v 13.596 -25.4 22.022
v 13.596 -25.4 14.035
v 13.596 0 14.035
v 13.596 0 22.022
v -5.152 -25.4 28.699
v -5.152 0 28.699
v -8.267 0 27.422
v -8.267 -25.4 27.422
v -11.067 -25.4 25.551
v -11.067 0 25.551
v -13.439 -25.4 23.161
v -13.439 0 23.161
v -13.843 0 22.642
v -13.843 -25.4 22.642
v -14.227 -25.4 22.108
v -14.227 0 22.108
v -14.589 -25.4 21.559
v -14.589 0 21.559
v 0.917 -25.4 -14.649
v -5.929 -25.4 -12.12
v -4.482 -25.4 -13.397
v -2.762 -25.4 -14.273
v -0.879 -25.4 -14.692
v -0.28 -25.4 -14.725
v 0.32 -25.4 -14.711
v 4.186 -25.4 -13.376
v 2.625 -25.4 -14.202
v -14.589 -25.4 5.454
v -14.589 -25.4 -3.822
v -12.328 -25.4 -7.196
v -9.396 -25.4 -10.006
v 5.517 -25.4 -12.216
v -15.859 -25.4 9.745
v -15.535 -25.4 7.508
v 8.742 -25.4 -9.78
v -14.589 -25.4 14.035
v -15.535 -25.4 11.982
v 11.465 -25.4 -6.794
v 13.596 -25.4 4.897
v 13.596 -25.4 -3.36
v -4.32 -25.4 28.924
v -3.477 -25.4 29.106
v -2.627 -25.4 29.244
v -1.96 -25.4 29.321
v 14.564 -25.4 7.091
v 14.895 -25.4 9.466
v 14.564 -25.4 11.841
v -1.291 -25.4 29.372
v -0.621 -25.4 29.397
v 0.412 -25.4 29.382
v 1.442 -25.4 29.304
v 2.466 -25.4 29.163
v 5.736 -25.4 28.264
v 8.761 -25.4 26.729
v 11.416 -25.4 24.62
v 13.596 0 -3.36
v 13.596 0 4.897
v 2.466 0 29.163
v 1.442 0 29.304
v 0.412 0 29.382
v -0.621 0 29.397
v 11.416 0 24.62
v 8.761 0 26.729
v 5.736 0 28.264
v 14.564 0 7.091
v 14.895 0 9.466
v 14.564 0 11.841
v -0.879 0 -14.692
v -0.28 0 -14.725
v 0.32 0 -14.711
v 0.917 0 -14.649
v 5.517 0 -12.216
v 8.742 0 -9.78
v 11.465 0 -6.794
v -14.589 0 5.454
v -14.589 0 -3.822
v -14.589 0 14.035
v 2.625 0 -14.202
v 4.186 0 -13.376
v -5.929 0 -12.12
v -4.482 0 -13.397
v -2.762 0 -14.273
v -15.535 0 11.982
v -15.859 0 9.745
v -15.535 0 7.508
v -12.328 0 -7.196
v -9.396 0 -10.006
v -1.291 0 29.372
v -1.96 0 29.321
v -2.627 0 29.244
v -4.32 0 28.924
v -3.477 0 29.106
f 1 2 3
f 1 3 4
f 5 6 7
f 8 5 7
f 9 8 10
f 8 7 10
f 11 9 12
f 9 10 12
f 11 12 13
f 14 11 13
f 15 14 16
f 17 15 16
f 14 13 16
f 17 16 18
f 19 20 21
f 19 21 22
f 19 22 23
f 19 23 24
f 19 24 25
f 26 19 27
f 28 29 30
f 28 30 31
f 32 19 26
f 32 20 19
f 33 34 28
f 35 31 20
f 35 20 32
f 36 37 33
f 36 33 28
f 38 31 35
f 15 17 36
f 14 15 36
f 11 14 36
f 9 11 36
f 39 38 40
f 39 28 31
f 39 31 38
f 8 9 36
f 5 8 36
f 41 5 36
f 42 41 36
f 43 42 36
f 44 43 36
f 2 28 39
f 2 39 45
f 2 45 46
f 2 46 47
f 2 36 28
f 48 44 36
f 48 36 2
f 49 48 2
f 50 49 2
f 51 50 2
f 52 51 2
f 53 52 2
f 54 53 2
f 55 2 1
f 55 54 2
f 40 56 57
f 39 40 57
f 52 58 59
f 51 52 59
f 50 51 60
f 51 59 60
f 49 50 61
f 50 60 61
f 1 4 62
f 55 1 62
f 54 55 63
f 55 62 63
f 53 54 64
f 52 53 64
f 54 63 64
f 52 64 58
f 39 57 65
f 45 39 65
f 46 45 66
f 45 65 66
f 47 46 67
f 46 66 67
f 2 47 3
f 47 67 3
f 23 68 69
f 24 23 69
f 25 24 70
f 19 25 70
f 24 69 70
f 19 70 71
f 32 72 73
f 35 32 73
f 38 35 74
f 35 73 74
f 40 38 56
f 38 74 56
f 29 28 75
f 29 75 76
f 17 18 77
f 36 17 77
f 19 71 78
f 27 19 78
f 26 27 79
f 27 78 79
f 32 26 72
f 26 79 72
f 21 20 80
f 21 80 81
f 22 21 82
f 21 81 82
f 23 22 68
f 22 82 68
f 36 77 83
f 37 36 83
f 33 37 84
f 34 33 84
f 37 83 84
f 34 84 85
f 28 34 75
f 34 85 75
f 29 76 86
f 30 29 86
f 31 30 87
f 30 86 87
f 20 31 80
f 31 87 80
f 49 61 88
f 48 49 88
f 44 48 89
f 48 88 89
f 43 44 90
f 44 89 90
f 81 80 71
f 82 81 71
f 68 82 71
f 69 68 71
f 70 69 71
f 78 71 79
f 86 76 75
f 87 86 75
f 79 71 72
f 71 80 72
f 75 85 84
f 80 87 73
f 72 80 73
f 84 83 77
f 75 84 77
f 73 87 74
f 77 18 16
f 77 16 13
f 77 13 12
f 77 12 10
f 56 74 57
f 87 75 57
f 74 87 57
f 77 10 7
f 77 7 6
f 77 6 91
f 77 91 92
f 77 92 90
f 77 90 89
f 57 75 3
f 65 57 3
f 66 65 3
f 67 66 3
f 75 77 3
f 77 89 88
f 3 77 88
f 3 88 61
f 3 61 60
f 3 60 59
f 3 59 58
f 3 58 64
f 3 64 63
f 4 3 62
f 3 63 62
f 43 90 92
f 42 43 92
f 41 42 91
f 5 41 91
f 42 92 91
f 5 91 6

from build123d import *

# Parameters (mm, degrees)
F0_R     = 2.5545771164
F1_DEPTH = 25.4


with BuildPart() as f1:
    # F0 (on Front) → F1 (new body)
    with BuildSketch(Plane.XZ):
        with BuildLine():
            ThreePointArc((5.5173615, -12.2159869029), (10.1722749208, -8.349582263), (13.5962825941, -3.3602461101))
            Line((13.5962825941, -3.3602461101), (13.5962825941, 4.8974110327))
            Line((13.5962825941, 4.8974110327), (13.5962825941, 14.0348058194))
            Line((13.5962825941, 14.0348058194), (13.5962825941, 22.0215348944))
            ThreePointArc((13.5962825941, 22.0215348944), (7.0004948303, 23.9860138876), (2.4660649804, 29.163130834))
            ThreePointArc((2.4660649804, 29.163130834), (0.9278228298, 29.3509775836), (-0.6211690061, 29.3967990577))
            ThreePointArc((-0.6211690061, 29.3967990577), (-6.7674815186, 23.985159586), (-14.5891272378, 21.5592870597))
            Line((-14.5891272378, 21.5592870597), (-14.5891272378, 14.0348058194))
            Line((-14.5891272378, 14.0348058194), (-14.5891272378, 5.4543889128))
            Line((-14.5891272378, 5.4543889128), (-14.5891272378, -3.8224939448))
            ThreePointArc((-14.5891272378, -3.8224939448), (-10.9382332049, -8.6804949763), (-5.9286805309, -12.1204925444))
            ThreePointArc((-5.9286805309, -12.1204925444), (-3.6496885116, -13.8889948714), (-0.8791223551, -14.6923430381))
            Line((-0.8791223551, -14.6923430381), (-1.524235704, -12.442663312))
            Line((-1.524235704, -12.442663312), (-0.8053276106, -12.442663312))
            Line((-0.8053276106, -12.442663312), (1.6964728711, -12.442663312))
            Line((1.6964728711, -12.442663312), (0.9172699194, -14.6494874696))
            ThreePointArc((0.9172699194, -14.6494874696), (3.4296394179, -13.8340966584), (5.5173615, -12.2159869029))
        make_face()
        with BuildLine():
            ThreePointArc((4.1042999377, -5.4248327223), (-0.1629000623, -7.0430521679), (-4.4301000623, -5.4248327223))
            ThreePointArc((-4.4301000623, -5.4248327223), (-0.1629000623, -4.7424848144), (4.1042999377, -5.4248327223))
        make_face(mode=Mode.SUBTRACT)
        with BuildLine():
            ThreePointArc((-5.5468901992, -5.0085484982), (-0.1374995827, -3.3742803628), (5.2100941539, -5.2006375045))
            ThreePointArc((5.2100941539, -5.2006375045), (-0.1549943991, -4.3539900851), (-5.5468901992, -5.0085484982))
        make_face(mode=Mode.SUBTRACT)
        with BuildLine():
            Line((-1.1811126024, 3.6468864419), (0, 8.5498616099))
            Line((0, 8.5498616099), (0.9875110118, 3.6468864419))
            ThreePointArc((0.9875110118, 3.6468864419), (-0.0968007953, 3.4477826759), (-1.1811126024, 3.6468864419))
        make_face(mode=Mode.SUBTRACT)
        with Locations((-5.9286805309, 12.5275942676)):
            Circle(F0_R, mode=Mode.SUBTRACT)
        with Locations((5.2393031111, 12.5385038482)):
            Circle(F0_R, mode=Mode.SUBTRACT)
        with Locations((-5.9286805309, 12.5275942676)):
            Circle(F0_R)
        with Locations((5.2393031111, 12.5385038482)):
            Circle(F0_R)
        with BuildLine():
            ThreePointArc((-14.5891272378, 21.5592870597), (-8.0233624944, 24.4917266981), (-2.6266052104, 29.2439345762))
            ThreePointArc((-2.6266052104, 29.2439345762), (-3.8995230158, 29.0200605642), (-5.1515523835, 28.6993398522))
            ThreePointArc((-5.1515523835, 28.6993398522), (-9.00952741, 25.5027604596), (-13.4385656433, 23.1606008906))
            ThreePointArc((-13.4385656433, 23.1606008906), (-14.0372751917, 22.3767777904), (-14.5891272378, 21.5592870597))
        make_face()
        with BuildLine():
            ThreePointArc((-14.5891272378, 21.5592870597), (-6.7674815186, 23.985159586), (-0.6211690061, 29.3967990577))
            ThreePointArc((-0.6211690061, 29.3967990577), (-1.6261684912, 29.3502963848), (-2.6266052104, 29.2439345762))
            ThreePointArc((-2.6266052104, 29.2439345762), (-8.0233624944, 24.4917266981), (-14.5891272378, 21.5592870597))
        make_face()
        with BuildLine():
            ThreePointArc((4.1042999377, -5.4248327223), (-0.1629000623, -4.7424848144), (-4.4301000623, -5.4248327223))
            ThreePointArc((-4.4301000623, -5.4248327223), (-0.1629000623, -7.0430521679), (4.1042999377, -5.4248327223))
        make_face()
        with BuildLine():
            ThreePointArc((2.4660649804, 29.163130834), (8.0510188895, 25.6232615682), (13.5962825941, 22.0215348944))
            ThreePointArc((13.5962825941, 22.0215348944), (8.7605664052, 26.7290953796), (2.4660649804, 29.163130834))
        make_face()
        with BuildLine():
            ThreePointArc((2.4660649804, 29.163130834), (7.5150761888, 24.7879918416), (13.5962825941, 22.0215348944))
            ThreePointArc((13.5962825941, 22.0215348944), (8.0510188895, 25.6232615682), (2.4660649804, 29.163130834))
        make_face()
        with BuildLine():
            ThreePointArc((2.4660649804, 29.163130834), (7.0004948303, 23.9860138876), (13.5962825941, 22.0215348944))
            ThreePointArc((13.5962825941, 22.0215348944), (7.5150761888, 24.7879918416), (2.4660649804, 29.163130834))
        make_face()
        with BuildLine():
            ThreePointArc((-13.4385656433, 23.1606008906), (-9.00952741, 25.5027604596), (-5.1515523835, 28.6993398522))
            ThreePointArc((-5.1515523835, 28.6993398522), (-9.7137087169, 26.5563504315), (-13.4385656433, 23.1606008906))
        make_face()
        with BuildLine():
            Line((13.5962825941, 14.0348058194), (13.5962825941, 4.8974110327))
            ThreePointArc((13.5962825941, 4.8974110327), (14.8954022083, 9.4661084261), (13.5962825941, 14.0348058194))
        make_face()
        with BuildLine():
            ThreePointArc((-14.5891272378, 14.0348058194), (-15.8586854832, 9.7445973661), (-14.5891272378, 5.4543889128))
            Line((-14.5891272378, 5.4543889128), (-14.5891272378, 14.0348058194))
        make_face()
        with BuildLine():
            ThreePointArc((-5.5468901992, -5.0085484982), (-0.1549943991, -4.3539900851), (5.2100941539, -5.2006375045))
            ThreePointArc((5.2100941539, -5.2006375045), (-0.1374995827, -3.3742803628), (-5.5468901992, -5.0085484982))
        make_face()
        with BuildLine():
            Line((0.9875110118, 3.6468864419), (0, 8.5498616099))
            Line((0, 8.5498616099), (-1.1811126024, 3.6468864419))
            ThreePointArc((-1.1811126024, 3.6468864419), (-0.0968007953, 3.4477826759), (0.9875110118, 3.6468864419))
        make_face()
        Polygon((-0.8791223551, -14.6923430381), (0.9172699194, -14.6494874696), (1.6964728711, -12.442663312), (-0.8053276106, -12.442663312), (-1.524235704, -12.442663312), align=None)
        with BuildLine():
            ThreePointArc((-0.8791223551, -14.6923430381), (0.0203310213, -14.7236153998), (0.9172699194, -14.6494874696))
            Line((0.9172699194, -14.6494874696), (-0.8791223551, -14.6923430381))
        make_face()
    extrude(amount=F1_DEPTH)


solid = f1.part
